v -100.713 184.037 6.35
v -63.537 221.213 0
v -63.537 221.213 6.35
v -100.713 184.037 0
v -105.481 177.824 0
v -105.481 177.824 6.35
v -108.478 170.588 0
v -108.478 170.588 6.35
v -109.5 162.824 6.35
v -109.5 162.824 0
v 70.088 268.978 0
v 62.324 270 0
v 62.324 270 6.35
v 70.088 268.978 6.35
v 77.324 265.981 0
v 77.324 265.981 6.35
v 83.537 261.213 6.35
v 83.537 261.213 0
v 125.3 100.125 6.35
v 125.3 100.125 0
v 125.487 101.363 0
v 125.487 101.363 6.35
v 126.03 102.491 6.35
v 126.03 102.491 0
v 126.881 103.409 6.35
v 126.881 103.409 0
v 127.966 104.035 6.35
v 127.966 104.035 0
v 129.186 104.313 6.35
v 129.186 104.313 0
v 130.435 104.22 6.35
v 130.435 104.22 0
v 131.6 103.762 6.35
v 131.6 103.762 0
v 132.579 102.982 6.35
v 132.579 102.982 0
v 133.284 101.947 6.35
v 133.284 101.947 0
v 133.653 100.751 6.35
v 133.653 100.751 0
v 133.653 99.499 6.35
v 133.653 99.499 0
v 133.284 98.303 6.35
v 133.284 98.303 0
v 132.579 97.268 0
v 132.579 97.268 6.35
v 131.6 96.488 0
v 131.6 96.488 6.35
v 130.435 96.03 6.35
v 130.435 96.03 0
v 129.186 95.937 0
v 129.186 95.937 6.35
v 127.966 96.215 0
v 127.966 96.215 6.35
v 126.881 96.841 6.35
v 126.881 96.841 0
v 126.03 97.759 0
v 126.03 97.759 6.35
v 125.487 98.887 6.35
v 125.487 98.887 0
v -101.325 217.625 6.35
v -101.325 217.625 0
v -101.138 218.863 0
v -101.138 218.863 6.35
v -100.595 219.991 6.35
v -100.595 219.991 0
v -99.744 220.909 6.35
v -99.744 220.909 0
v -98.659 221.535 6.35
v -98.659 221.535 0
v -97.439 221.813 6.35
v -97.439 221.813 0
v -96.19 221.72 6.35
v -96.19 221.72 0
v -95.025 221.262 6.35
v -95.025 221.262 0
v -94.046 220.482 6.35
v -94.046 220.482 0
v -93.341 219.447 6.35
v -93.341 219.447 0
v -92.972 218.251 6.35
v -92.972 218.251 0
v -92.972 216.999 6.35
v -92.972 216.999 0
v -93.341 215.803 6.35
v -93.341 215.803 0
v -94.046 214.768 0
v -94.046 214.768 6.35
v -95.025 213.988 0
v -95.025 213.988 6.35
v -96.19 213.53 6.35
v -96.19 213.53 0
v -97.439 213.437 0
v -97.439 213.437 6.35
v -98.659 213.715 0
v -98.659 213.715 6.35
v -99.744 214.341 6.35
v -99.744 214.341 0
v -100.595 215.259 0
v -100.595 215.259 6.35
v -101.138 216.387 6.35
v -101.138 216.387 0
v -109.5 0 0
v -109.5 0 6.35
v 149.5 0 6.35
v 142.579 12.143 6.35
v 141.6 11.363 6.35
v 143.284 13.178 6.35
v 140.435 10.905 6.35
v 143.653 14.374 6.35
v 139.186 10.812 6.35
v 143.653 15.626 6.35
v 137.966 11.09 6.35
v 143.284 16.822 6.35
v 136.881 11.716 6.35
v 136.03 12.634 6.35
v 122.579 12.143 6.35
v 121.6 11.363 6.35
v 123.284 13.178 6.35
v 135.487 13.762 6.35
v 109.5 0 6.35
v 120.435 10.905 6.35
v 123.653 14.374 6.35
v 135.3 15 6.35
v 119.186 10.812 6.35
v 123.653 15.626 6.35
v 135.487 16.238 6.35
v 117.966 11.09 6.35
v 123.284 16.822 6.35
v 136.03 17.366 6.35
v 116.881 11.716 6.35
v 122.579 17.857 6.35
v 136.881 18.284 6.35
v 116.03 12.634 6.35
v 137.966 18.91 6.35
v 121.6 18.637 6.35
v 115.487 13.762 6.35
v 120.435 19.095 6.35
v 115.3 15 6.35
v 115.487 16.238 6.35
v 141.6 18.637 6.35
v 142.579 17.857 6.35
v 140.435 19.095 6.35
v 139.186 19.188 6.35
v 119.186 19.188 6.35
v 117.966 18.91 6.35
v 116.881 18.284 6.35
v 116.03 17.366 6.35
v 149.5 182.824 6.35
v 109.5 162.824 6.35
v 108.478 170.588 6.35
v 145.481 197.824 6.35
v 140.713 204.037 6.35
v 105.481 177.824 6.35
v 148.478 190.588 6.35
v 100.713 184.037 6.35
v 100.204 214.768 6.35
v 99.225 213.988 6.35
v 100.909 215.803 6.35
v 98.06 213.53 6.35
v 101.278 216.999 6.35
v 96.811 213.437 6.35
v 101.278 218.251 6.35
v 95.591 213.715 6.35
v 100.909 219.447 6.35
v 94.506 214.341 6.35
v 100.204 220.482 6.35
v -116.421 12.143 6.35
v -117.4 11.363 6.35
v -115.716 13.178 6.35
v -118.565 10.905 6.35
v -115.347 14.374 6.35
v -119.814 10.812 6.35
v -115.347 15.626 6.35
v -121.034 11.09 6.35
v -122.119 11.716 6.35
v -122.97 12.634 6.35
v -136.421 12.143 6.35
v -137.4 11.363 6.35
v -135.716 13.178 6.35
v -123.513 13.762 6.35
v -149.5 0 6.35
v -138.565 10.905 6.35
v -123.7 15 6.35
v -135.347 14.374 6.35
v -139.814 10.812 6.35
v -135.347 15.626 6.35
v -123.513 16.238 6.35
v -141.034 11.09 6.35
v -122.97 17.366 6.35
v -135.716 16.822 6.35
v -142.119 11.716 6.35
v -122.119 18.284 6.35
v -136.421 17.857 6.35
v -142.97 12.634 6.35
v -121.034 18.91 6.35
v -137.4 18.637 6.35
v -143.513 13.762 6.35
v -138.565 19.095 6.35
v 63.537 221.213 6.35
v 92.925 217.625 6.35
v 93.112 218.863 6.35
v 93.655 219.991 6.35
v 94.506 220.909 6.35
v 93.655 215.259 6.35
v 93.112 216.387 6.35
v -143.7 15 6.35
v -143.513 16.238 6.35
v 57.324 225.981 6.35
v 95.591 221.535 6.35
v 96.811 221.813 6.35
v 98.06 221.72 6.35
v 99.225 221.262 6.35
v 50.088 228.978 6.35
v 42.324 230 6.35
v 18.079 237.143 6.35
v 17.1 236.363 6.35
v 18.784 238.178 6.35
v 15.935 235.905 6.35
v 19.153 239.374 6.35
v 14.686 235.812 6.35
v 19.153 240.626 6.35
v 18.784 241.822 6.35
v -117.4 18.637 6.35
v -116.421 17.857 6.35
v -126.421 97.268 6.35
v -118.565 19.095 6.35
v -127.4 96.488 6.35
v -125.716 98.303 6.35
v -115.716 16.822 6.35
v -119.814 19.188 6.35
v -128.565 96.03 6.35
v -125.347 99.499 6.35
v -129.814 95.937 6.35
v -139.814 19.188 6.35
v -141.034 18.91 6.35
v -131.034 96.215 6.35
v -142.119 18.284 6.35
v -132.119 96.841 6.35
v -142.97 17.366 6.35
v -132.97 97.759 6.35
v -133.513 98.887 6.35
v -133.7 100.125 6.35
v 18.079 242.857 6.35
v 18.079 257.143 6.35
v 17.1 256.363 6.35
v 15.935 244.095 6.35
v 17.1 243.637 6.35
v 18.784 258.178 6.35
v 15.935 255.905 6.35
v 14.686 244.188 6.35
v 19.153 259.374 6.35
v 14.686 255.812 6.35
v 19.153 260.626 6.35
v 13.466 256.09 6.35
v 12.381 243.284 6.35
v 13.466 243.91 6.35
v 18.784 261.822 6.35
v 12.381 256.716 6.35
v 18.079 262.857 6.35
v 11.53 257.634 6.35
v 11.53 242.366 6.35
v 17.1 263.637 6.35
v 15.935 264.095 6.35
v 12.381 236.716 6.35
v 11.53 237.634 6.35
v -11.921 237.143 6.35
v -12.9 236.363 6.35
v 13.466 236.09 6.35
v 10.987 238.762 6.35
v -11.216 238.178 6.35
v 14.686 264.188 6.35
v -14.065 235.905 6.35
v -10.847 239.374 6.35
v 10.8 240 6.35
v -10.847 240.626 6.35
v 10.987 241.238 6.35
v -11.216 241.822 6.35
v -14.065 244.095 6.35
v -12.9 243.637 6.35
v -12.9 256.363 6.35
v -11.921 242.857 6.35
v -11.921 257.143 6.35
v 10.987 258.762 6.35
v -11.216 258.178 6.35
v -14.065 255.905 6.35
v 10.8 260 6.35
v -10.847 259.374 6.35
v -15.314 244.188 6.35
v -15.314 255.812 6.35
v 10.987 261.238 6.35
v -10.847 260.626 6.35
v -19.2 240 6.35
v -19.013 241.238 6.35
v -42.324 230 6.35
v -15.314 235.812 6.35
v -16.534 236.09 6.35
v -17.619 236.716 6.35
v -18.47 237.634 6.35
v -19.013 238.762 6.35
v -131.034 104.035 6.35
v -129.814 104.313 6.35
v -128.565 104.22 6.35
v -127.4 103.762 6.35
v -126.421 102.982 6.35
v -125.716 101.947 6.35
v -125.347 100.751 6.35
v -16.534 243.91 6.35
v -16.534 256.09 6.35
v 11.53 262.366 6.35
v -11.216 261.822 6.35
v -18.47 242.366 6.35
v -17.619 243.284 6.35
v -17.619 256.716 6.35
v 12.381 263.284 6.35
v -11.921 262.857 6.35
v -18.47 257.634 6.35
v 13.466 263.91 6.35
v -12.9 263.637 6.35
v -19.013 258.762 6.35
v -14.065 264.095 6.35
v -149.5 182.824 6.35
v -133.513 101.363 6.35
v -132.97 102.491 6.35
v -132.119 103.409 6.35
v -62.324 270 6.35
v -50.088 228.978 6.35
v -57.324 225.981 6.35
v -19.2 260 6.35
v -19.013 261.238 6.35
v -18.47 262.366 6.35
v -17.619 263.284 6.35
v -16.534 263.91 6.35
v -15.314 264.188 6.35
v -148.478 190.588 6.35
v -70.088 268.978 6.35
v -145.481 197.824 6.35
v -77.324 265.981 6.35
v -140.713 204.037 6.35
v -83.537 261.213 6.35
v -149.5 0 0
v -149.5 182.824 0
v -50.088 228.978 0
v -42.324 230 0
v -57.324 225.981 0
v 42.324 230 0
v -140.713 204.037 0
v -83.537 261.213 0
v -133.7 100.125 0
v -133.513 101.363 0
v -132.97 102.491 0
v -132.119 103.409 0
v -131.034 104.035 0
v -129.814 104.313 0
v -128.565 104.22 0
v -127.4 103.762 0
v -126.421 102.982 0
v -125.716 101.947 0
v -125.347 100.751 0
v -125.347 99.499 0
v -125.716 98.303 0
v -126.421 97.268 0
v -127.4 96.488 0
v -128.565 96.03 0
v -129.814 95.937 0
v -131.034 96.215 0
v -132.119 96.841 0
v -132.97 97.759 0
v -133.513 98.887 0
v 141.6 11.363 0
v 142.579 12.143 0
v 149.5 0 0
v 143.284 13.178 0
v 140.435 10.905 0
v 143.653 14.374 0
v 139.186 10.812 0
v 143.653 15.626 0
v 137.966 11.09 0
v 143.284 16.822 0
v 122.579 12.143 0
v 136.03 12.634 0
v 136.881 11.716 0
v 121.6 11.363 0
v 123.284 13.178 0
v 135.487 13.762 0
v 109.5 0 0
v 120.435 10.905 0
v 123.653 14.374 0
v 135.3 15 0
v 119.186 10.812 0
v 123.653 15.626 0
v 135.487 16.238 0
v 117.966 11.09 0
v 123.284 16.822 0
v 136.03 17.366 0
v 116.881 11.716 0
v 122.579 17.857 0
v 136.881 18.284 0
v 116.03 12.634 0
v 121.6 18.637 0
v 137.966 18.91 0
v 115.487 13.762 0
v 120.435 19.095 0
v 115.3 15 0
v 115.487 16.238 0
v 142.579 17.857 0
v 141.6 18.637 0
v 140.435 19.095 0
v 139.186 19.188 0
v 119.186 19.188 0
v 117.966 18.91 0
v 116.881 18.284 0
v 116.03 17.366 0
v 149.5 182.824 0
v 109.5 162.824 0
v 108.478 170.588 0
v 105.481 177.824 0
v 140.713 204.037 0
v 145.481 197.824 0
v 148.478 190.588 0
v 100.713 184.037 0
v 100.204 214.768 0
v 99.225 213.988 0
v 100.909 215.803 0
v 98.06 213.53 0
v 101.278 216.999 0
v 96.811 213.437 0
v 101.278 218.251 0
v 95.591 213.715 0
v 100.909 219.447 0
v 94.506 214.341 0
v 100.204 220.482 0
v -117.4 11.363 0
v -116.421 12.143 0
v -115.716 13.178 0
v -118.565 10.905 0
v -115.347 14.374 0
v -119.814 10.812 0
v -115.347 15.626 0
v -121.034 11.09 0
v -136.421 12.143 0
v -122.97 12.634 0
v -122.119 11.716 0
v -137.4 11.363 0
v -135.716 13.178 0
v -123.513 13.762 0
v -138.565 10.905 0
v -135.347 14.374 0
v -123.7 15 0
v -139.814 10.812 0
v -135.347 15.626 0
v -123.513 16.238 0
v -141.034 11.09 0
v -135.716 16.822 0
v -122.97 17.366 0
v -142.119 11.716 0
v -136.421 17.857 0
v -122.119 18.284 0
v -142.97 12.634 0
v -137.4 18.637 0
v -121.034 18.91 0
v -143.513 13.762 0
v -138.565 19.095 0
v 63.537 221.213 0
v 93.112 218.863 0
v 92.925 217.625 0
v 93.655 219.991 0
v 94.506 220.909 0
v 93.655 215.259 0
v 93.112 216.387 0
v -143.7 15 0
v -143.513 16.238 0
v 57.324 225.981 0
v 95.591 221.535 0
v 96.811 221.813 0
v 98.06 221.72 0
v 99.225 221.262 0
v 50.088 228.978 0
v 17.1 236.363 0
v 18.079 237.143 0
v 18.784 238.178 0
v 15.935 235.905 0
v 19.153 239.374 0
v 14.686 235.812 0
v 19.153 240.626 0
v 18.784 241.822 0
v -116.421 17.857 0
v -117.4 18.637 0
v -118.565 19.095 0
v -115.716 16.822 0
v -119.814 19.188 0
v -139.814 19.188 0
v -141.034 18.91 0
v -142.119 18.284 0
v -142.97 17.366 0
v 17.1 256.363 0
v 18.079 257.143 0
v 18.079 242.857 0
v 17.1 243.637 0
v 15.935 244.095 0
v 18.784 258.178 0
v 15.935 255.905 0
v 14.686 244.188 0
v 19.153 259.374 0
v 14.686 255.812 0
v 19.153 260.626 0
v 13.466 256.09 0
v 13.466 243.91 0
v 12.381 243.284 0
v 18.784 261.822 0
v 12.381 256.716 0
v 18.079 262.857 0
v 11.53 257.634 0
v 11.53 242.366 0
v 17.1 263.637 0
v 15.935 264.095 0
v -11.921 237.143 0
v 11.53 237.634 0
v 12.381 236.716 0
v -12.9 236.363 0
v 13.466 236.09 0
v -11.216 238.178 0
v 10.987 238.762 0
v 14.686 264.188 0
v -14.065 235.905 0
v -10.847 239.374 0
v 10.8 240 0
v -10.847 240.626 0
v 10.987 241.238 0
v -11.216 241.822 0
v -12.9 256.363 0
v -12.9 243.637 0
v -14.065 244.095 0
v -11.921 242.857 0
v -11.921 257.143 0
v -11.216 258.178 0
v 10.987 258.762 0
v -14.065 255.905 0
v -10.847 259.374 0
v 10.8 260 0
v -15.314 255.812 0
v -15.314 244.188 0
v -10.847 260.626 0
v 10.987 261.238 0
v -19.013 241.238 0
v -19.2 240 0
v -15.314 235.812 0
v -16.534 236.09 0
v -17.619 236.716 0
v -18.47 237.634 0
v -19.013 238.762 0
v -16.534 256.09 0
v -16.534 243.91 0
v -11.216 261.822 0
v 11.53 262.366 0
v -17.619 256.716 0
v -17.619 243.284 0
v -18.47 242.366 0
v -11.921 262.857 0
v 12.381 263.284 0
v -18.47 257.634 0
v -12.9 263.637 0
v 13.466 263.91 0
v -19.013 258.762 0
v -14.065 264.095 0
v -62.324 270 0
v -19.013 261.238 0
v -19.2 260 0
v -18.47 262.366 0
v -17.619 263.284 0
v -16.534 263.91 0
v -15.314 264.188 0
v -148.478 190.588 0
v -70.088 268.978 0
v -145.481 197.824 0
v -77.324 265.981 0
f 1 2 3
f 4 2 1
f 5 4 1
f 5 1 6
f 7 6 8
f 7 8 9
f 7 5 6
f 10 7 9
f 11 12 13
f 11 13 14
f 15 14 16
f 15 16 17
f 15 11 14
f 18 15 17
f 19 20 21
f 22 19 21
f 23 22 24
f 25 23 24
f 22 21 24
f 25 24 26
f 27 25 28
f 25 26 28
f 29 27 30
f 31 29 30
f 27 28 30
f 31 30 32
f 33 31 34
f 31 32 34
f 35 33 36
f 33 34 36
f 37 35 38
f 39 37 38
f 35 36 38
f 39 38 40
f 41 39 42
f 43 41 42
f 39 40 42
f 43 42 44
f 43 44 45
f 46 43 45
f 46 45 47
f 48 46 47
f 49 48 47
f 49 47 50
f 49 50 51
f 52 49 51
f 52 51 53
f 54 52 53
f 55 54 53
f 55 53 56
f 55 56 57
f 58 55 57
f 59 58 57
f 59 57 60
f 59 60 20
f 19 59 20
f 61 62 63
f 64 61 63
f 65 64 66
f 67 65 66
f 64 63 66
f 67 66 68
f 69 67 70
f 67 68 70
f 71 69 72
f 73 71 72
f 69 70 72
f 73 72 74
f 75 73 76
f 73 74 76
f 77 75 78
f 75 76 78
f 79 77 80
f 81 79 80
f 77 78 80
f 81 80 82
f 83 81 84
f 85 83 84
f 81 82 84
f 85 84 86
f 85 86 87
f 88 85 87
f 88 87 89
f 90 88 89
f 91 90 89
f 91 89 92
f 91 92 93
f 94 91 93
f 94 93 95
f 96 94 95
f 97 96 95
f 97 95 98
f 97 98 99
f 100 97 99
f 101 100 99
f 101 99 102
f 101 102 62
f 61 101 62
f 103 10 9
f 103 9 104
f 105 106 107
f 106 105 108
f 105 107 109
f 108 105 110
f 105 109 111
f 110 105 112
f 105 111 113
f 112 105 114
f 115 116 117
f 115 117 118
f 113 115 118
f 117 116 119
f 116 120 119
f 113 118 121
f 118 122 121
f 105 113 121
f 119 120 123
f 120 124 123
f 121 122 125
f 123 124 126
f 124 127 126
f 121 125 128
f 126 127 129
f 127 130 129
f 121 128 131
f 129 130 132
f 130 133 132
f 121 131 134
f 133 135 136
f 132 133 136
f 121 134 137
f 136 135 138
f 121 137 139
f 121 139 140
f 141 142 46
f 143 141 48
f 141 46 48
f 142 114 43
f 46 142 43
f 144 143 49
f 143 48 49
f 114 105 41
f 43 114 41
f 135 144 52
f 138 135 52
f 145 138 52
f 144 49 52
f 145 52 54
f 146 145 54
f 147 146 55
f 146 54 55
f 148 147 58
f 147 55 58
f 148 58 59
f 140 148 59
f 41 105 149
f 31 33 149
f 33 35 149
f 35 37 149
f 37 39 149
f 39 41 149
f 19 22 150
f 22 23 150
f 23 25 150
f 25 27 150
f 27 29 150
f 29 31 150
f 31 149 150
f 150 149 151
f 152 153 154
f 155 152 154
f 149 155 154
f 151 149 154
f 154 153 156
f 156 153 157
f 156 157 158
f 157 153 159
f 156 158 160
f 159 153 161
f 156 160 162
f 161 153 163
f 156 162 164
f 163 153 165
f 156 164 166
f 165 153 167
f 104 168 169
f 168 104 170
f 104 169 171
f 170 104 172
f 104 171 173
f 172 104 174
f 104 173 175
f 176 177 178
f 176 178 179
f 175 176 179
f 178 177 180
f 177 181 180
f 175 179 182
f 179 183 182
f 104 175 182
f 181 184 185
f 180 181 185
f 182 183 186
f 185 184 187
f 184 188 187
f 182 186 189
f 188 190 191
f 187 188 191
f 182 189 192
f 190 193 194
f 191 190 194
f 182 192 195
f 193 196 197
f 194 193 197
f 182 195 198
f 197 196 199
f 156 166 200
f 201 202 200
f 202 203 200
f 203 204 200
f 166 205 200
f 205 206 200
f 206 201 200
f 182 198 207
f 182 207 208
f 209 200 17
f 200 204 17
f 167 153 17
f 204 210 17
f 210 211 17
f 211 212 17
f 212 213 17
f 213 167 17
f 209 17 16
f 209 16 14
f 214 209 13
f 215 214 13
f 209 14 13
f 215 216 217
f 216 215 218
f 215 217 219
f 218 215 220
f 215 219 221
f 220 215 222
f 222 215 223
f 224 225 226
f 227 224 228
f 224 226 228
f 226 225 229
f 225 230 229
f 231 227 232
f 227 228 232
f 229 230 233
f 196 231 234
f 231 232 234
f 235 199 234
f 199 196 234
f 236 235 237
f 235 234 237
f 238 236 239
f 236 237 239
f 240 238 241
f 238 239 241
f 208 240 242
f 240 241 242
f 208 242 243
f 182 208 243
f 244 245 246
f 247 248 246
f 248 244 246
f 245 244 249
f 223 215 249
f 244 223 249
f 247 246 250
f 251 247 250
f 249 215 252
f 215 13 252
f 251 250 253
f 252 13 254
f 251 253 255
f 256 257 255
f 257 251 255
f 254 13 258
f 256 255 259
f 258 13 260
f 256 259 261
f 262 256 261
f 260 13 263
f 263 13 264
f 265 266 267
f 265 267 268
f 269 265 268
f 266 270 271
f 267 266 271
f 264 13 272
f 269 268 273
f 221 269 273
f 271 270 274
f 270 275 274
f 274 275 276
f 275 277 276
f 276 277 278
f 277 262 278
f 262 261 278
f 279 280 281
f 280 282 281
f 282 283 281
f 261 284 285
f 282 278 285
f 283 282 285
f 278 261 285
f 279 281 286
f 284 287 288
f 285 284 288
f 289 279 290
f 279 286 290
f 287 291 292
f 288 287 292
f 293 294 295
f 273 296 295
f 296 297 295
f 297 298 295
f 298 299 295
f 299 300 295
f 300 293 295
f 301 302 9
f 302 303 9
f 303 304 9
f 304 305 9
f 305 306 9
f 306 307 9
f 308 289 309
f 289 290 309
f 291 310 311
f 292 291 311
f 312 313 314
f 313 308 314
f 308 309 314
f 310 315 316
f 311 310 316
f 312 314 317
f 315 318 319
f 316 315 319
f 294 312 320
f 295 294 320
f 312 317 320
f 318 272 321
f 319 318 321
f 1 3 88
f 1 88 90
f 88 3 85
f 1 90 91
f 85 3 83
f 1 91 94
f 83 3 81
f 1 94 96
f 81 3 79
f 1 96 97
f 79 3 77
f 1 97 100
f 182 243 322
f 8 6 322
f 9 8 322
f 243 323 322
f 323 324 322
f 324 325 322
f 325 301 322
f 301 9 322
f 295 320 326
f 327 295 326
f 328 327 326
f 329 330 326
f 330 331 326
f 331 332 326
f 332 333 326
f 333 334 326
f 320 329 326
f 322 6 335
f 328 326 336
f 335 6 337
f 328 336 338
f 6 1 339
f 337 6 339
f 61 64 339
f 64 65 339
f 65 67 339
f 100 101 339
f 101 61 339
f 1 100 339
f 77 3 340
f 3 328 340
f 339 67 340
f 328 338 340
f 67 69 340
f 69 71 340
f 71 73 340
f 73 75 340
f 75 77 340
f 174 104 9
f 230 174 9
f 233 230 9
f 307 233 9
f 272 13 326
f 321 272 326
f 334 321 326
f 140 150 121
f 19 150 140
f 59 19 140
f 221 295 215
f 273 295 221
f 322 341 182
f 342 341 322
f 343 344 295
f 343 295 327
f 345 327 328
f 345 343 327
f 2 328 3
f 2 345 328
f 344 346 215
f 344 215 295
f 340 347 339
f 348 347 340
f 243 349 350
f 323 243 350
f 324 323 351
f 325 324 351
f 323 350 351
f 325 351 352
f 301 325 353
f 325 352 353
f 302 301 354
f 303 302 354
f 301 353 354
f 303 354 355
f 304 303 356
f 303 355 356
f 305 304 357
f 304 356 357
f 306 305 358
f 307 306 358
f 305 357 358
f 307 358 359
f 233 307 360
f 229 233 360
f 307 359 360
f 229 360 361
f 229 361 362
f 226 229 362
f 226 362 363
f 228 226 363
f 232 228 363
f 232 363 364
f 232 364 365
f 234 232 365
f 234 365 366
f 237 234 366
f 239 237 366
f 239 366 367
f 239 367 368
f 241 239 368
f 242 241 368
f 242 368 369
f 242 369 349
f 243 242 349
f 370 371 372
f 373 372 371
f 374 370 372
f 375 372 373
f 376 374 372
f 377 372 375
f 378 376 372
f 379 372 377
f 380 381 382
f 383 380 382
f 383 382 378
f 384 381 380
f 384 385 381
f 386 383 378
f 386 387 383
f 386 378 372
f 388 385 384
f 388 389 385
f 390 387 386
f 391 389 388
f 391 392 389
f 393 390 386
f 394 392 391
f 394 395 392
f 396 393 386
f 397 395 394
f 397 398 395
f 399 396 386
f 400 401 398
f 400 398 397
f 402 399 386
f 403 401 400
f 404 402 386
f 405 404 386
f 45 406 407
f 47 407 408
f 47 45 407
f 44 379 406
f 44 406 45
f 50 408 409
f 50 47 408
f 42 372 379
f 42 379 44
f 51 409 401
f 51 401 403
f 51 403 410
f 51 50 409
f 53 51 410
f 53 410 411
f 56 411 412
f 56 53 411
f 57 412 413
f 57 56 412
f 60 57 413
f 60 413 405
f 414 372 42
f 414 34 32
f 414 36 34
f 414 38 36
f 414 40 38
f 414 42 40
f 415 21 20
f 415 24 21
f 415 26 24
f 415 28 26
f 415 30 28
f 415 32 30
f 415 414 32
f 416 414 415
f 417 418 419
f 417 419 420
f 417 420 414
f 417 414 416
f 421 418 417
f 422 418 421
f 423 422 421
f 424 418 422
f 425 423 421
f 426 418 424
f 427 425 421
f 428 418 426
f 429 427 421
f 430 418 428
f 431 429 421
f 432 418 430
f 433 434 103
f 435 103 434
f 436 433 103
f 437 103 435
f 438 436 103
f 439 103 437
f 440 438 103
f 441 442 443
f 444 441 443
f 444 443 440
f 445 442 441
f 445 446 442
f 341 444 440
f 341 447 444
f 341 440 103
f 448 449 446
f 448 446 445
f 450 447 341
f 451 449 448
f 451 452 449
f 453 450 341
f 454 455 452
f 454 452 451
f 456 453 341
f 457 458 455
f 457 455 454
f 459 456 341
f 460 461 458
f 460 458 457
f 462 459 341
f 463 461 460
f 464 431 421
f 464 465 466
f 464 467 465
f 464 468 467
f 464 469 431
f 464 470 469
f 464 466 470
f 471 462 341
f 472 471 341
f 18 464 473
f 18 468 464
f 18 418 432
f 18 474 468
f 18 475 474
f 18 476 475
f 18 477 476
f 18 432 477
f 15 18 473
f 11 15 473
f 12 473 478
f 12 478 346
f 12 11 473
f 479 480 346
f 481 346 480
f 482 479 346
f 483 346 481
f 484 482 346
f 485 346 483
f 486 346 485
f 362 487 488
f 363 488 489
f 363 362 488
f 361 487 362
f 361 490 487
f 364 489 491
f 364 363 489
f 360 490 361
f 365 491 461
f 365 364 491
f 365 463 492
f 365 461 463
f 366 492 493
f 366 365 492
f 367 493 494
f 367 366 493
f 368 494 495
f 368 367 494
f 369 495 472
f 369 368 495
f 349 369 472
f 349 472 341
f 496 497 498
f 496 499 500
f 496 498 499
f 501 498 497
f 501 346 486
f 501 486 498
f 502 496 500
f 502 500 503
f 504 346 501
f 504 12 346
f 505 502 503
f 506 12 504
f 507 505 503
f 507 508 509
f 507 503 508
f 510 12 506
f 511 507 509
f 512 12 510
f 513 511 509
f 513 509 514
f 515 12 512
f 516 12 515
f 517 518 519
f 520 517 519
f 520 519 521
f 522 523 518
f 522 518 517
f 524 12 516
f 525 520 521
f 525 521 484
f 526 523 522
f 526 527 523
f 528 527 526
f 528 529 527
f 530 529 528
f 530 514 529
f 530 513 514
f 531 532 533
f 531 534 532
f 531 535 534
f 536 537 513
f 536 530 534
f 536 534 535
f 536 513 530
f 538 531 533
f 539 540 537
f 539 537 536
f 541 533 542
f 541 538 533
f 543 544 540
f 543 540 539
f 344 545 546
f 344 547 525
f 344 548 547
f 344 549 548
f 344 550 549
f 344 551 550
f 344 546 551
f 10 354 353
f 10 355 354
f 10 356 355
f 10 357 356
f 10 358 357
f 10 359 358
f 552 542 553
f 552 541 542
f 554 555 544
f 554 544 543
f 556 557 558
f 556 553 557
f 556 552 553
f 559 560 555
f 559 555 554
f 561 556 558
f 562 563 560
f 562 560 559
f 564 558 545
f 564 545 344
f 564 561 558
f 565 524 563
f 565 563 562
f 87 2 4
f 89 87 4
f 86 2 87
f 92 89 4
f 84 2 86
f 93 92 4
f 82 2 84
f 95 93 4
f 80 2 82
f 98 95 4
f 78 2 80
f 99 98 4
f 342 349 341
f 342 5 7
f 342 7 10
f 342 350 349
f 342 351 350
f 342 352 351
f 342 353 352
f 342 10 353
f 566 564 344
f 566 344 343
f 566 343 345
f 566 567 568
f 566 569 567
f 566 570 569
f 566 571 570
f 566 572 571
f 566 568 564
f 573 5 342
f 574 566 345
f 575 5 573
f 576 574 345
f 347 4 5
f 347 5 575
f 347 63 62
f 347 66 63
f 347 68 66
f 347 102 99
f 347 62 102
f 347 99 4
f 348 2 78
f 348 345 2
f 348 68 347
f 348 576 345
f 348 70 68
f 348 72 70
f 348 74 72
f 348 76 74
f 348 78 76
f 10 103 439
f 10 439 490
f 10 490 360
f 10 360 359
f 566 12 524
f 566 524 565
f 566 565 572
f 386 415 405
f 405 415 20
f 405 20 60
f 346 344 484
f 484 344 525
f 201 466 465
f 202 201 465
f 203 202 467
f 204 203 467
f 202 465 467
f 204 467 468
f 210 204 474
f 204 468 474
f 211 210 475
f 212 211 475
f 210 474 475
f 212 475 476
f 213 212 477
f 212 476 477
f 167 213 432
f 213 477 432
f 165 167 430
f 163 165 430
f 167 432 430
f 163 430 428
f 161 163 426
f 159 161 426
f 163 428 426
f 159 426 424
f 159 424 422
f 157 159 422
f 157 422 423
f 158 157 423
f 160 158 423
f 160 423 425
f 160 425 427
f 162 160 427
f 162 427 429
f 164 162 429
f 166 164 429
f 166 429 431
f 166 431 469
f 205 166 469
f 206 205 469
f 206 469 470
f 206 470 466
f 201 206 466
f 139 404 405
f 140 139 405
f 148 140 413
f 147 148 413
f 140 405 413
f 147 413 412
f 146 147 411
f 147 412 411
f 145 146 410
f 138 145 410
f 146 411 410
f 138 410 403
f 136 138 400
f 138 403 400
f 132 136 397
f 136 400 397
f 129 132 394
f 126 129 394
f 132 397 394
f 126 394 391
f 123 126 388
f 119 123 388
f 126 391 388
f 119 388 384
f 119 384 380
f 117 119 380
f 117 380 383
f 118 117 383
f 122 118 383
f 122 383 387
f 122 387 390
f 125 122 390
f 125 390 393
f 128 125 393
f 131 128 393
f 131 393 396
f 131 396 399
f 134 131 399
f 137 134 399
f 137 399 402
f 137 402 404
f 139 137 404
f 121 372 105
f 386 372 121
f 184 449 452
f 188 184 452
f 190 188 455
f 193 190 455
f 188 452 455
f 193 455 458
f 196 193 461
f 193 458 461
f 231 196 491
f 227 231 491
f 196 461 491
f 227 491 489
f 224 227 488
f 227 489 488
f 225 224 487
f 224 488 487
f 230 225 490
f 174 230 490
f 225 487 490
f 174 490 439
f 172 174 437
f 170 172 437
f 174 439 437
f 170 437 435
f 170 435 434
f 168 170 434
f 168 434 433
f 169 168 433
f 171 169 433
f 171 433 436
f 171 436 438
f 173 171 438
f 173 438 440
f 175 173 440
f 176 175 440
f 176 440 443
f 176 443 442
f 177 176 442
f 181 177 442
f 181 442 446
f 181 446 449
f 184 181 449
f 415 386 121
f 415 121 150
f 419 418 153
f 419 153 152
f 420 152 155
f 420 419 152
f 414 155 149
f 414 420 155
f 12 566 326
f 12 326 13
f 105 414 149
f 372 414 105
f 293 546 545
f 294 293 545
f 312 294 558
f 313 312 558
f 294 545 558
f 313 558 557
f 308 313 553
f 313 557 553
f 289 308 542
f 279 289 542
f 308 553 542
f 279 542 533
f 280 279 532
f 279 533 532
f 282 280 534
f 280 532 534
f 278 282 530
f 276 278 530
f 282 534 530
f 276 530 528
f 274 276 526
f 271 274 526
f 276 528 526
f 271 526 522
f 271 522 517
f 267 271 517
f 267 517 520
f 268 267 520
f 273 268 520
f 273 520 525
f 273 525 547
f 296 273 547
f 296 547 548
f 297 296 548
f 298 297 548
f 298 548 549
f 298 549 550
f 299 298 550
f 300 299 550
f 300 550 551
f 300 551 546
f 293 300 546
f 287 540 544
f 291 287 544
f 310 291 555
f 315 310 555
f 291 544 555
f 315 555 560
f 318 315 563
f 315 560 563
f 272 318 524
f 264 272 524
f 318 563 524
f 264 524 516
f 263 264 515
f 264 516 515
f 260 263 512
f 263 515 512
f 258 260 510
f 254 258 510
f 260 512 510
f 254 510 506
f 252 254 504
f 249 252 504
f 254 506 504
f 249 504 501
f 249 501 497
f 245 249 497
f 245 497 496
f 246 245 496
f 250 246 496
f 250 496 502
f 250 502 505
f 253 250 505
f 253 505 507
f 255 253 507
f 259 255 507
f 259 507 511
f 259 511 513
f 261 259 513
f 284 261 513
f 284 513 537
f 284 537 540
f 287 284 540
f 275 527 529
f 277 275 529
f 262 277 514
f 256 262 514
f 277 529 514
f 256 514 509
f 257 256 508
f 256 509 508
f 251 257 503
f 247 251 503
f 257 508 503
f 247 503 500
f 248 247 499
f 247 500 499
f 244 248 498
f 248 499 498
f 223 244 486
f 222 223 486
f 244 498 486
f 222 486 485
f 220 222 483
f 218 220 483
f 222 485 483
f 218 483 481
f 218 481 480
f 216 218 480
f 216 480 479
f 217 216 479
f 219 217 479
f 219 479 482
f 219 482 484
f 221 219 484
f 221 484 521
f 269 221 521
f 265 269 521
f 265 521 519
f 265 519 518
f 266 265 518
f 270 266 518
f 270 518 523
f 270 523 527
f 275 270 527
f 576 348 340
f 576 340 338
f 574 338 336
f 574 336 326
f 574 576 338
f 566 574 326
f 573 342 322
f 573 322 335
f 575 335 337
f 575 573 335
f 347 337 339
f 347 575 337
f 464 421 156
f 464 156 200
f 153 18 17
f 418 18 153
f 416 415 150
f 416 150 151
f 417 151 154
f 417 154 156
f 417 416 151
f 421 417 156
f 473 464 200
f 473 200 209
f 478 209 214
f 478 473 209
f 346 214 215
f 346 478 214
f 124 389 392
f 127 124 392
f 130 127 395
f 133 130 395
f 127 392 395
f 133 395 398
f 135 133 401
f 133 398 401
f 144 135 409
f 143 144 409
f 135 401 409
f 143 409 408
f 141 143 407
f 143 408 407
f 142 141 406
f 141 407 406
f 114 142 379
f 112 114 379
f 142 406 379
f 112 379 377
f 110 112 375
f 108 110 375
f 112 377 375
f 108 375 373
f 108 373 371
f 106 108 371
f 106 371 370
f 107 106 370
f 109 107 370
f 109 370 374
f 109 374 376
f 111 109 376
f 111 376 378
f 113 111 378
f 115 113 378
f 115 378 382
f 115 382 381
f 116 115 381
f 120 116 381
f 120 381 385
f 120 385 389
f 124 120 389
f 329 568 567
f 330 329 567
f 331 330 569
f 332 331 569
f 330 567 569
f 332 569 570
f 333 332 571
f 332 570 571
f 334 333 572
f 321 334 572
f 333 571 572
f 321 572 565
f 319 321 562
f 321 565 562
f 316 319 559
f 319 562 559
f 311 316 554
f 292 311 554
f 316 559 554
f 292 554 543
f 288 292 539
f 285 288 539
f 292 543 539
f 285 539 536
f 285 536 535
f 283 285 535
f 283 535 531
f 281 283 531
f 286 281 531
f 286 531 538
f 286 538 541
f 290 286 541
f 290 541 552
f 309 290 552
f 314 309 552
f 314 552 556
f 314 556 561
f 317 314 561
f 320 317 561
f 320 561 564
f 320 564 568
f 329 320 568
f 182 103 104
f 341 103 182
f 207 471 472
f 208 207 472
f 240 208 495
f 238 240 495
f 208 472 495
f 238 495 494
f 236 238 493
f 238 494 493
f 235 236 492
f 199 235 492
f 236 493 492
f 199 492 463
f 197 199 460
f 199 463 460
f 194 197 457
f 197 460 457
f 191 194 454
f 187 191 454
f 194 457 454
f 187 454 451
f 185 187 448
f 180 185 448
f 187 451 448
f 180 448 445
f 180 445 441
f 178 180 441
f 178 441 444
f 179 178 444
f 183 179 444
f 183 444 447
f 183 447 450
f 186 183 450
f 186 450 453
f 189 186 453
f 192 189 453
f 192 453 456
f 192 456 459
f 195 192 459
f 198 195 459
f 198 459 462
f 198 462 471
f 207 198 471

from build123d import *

# Parameters (mm, degrees)
SALIENTE_EXTRUIR1_DEPTH      = 6.35
TALADRO_DE_MARGEN_PARA_M81_D = 8.4


with BuildPart() as part:
    # Croquis1 → Saliente-Extruir1 (new body)
    with BuildSketch(Plane.XY):
        with BuildLine():
            Line((-63.536796564, 221.213203436), (-100.713203436, 184.036796564))
            ThreePointArc((-100.713203436, 184.036796564), (-107.216385975, 174.3040961), (-109.5, 162.823593129))
            Line((-109.5, 162.823593129), (-109.5, 0))
            Line((-109.5, 0), (-149.5, 0))
            Line((-149.5, 0), (-149.5, 182.823593129))
            ThreePointArc((-149.5, 182.823593129), (-147.216385975, 194.3040961), (-140.713203436, 204.036796564))
            Line((-140.713203436, 204.036796564), (-83.536796564, 261.213203436))
            ThreePointArc((-83.536796564, 261.213203436), (-73.8040961, 267.716385975), (-62.323593129, 270))
            Line((-62.323593129, 270), (62.323593129, 270))
            ThreePointArc((62.323593129, 270), (73.8040961, 267.716385975), (83.536796564, 261.213203436))
            Line((83.536796564, 261.213203436), (140.713203436, 204.036796564))
            ThreePointArc((140.713203436, 204.036796564), (147.216385975, 194.3040961), (149.5, 182.823593129))
            Line((149.5, 182.823593129), (149.5, 0))
            Line((149.5, 0), (109.5, 0))
            Line((109.5, 0), (109.5, 162.823593129))
            ThreePointArc((109.5, 162.823593129), (107.216385975, 174.3040961), (100.713203436, 184.036796564))
            Line((100.713203436, 184.036796564), (63.536796564, 221.213203436))
            ThreePointArc((63.536796564, 221.213203436), (53.8040961, 227.716385975), (42.323593129, 230))
            Line((42.323593129, 230), (-42.323593129, 230))
            ThreePointArc((-42.323593129, 230), (-53.8040961, 227.716385975), (-63.536796564, 221.213203436))
        make_face()
    extrude(amount=SALIENTE_EXTRUIR1_DEPTH)

    # Taladro de margen para M81 (through all)
    with Locations(Plane.XY.offset(6.35)):
        with Locations((-119.5, 15), (-139.5, 15), (0, 15), (139.5, 15), (-15, 260), (-15, 240), (15, 240), (15, 260), (-129.5, 100.125), (-97.125, 217.625), (129.5, 100.125), (97.125, 217.625), (119.5, 15)):
            Hole(TALADRO_DE_MARGEN_PARA_M81_D / 2)


solid = part.part
